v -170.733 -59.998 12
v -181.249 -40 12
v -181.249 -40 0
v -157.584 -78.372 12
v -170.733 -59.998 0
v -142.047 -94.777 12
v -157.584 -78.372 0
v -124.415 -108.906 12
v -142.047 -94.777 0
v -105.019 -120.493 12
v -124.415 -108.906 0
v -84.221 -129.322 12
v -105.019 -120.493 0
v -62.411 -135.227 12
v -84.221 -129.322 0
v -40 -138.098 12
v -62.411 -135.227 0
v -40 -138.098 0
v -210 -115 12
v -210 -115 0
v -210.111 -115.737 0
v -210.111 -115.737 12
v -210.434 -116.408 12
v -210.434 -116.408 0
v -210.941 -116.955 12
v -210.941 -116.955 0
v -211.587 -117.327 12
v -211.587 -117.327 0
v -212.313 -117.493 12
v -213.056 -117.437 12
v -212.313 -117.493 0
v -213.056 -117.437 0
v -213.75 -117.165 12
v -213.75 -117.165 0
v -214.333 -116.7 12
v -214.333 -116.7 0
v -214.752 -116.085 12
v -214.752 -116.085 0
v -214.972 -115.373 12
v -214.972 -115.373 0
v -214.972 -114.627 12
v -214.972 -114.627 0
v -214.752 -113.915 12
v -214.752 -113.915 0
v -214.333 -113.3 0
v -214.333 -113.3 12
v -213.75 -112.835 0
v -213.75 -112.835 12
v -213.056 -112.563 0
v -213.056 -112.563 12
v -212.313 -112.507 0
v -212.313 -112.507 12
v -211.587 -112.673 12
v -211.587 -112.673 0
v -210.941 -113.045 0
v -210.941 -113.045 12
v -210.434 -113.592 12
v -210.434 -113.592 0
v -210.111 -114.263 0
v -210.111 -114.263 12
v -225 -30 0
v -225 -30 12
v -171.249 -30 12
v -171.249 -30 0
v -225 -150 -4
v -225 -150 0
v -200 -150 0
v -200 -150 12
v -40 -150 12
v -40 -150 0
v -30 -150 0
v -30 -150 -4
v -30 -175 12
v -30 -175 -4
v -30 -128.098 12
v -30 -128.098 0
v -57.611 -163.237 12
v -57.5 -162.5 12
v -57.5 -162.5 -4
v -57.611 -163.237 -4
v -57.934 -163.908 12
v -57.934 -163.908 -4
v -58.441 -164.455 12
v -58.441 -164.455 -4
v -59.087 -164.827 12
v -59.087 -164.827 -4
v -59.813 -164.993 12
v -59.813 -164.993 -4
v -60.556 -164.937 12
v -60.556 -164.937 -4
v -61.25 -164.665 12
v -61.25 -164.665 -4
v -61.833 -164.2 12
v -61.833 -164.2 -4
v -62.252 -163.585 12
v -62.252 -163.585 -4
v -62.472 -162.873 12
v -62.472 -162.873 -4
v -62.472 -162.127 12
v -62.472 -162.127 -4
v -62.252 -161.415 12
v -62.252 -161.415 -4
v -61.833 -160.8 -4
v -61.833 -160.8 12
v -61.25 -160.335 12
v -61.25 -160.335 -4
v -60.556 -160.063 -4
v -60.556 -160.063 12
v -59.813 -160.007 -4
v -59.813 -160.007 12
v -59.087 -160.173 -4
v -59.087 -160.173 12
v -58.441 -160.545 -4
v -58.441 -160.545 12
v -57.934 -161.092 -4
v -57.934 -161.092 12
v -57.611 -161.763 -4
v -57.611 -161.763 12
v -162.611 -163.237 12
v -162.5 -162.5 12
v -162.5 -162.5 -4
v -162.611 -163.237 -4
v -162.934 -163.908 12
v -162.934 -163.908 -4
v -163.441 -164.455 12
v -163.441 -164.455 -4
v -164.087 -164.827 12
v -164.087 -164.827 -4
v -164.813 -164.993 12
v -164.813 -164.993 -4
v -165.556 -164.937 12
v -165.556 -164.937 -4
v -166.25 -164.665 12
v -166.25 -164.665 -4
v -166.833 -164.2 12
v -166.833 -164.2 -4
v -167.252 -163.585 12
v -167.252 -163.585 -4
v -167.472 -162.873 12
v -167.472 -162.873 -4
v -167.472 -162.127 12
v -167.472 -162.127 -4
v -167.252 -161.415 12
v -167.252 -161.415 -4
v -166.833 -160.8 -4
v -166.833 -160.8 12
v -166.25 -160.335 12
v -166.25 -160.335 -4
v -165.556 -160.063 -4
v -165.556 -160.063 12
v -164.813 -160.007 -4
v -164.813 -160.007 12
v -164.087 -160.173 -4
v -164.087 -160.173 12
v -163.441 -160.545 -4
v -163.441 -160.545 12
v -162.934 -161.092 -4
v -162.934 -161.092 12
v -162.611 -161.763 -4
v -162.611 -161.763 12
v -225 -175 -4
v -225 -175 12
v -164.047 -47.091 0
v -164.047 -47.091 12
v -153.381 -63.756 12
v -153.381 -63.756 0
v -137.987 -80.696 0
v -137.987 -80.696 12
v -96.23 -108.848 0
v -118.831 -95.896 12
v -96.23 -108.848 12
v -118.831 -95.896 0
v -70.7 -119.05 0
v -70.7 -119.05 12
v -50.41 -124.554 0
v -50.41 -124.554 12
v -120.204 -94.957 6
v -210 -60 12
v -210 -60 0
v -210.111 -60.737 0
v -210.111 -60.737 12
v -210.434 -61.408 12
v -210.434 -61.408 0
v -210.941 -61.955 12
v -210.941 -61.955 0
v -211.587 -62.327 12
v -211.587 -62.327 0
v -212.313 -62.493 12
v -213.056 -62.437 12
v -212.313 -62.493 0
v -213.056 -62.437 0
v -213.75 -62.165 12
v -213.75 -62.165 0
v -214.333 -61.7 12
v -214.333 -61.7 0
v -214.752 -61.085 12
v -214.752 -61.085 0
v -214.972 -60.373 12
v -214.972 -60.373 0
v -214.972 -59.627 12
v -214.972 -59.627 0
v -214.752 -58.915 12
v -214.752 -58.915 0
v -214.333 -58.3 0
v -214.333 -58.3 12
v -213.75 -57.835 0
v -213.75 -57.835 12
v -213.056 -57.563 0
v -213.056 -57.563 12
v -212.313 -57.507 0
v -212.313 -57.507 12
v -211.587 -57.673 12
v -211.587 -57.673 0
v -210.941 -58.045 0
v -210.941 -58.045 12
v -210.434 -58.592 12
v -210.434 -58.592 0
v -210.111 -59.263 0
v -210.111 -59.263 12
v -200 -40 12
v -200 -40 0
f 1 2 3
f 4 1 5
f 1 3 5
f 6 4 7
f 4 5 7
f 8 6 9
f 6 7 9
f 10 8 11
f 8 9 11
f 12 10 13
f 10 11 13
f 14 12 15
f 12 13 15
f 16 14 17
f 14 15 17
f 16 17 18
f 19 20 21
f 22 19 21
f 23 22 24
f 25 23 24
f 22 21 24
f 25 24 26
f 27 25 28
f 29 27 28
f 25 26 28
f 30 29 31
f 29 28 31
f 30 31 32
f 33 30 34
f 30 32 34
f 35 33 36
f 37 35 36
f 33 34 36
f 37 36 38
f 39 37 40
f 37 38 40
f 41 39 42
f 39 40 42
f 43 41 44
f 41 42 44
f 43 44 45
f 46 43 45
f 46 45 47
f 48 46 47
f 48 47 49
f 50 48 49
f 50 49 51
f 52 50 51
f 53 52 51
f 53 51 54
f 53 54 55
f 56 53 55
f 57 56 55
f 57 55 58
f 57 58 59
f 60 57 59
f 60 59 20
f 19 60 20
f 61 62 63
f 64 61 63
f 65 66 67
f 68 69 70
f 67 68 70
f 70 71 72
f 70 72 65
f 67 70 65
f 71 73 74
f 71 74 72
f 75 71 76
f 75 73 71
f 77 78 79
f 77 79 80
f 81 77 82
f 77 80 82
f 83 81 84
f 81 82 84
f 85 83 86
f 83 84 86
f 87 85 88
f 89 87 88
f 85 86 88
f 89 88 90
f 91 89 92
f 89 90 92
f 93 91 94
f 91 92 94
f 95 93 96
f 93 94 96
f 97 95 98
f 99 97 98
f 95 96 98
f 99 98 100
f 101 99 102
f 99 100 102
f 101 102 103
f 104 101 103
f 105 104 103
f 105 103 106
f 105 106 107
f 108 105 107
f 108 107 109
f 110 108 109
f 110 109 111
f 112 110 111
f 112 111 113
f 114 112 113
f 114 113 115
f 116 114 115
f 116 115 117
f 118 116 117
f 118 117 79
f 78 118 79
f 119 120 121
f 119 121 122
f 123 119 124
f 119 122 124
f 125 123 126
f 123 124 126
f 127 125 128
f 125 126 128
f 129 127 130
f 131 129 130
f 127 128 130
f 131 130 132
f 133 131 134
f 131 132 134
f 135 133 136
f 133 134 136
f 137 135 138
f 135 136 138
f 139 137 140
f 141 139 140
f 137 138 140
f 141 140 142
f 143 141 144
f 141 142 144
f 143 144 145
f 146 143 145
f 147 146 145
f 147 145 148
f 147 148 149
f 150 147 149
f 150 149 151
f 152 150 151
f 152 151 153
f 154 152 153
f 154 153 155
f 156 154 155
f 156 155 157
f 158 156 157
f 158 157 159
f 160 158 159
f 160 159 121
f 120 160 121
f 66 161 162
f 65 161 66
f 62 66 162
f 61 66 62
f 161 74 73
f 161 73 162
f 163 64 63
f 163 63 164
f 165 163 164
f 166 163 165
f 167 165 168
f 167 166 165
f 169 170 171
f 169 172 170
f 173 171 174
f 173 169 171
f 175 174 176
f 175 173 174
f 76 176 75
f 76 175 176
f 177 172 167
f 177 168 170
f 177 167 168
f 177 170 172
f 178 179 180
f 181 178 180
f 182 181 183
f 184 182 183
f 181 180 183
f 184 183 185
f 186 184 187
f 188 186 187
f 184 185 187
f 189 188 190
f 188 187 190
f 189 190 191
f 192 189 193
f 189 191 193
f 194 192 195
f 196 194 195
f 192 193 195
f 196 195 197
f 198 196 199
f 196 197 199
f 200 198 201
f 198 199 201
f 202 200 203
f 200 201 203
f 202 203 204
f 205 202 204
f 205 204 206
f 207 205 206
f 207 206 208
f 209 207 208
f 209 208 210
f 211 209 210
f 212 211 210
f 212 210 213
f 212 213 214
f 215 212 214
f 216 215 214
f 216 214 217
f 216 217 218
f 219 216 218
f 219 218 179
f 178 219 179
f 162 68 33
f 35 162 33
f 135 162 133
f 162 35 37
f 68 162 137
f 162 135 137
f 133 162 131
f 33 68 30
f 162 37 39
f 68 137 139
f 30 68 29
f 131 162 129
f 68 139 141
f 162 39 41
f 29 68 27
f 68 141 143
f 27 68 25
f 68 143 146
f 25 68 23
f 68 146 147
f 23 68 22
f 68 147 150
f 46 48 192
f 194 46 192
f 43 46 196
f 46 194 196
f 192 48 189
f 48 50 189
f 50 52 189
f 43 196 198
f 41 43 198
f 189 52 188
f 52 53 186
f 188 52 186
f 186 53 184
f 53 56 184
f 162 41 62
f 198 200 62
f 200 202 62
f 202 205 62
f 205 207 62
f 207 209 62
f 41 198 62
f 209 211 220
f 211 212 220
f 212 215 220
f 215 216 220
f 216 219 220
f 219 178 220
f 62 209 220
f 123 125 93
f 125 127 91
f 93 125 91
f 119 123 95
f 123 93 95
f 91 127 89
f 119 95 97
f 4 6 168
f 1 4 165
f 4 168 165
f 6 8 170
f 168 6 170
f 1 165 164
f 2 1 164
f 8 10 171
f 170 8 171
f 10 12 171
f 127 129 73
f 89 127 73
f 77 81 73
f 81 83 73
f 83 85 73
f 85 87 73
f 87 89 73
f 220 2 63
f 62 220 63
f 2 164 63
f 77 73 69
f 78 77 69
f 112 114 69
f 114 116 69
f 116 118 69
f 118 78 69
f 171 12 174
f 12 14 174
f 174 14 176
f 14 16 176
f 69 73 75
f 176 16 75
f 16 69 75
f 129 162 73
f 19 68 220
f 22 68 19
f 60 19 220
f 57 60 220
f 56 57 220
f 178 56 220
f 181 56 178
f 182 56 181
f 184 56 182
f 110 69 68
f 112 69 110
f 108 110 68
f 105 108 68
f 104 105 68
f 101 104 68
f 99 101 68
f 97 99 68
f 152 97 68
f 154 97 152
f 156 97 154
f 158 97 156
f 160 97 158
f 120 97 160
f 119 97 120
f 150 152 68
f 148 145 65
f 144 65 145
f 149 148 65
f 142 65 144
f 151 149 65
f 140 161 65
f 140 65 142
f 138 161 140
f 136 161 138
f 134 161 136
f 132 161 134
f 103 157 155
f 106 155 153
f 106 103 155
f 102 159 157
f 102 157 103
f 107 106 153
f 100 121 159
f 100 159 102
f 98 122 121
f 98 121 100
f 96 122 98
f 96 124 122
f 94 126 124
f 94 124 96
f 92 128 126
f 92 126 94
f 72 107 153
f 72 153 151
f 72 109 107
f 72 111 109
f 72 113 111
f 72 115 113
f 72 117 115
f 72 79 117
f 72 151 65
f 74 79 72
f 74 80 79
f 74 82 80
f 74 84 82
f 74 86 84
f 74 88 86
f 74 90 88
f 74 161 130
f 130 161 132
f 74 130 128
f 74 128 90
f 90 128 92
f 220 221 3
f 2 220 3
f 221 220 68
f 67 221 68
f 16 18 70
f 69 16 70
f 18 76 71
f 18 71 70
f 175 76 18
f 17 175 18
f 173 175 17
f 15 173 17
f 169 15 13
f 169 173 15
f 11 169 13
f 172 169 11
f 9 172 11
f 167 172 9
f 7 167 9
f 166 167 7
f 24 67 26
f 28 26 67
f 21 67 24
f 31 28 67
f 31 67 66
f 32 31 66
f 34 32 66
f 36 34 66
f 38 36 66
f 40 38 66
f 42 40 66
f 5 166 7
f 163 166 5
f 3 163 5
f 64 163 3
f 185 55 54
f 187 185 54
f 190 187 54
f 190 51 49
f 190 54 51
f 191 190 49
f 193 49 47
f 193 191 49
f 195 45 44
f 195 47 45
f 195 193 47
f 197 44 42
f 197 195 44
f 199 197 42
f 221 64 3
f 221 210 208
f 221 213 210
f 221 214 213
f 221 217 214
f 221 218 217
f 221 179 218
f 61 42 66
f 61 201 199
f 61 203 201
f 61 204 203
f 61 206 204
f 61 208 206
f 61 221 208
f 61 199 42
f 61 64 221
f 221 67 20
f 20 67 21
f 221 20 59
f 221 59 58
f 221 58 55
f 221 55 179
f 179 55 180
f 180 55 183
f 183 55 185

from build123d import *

# Parameters (mm, degrees)
F1_DEPTH  = 12
F2_W      = 200
F2_H      = 20
F3_DEPTH  = 5
F4_W      = 155
F4_H      = 20
F5_DEPTH  = 5
F6_R      = 2.5
F7_DEPTH  = 25
F9_DEPTH  = 5
F10_W     = 195
F10_H     = 30
F10_W_2   = 30
F10_H_2   = 145
F11_DEPTH = 25
F12_W     = 145
F12_H     = 9
F13_DEPTH = 195.0010001
F15_DEPTH = 25
F17_DEPTH = 25


with BuildPart() as f1:
    # F0 (on Top) → F1 (new body)
    with BuildSketch(Plane.XY):
        with BuildLine():
            add(Edge.make_bspline(
                [(-176, 0), (-176, -130), (0, -130)],
                knots=[3.1415926536, 3.1415926536, 3.1415926536, 4.7123889804, 4.7123889804, 4.7123889804], degree=2, weights=[1, 0.7071067812, 1]))
            Line((-176, 0), (-176, -130))
            Line((-176, -130), (0, -130))
        make_face()
        Polygon((-176, -130), (-176, 0), (-200, 0), (-200, -150), (0, -150), (0, -130), align=None)
    extrude(amount=F1_DEPTH)

    # F2 (on face) → F3 (join)
    with BuildSketch(Plane.XZ.offset(150)):
        with Locations((-100, 6)):
            Rectangle(F2_W, F2_H)
    extrude(amount=F3_DEPTH)

    # F4 (on face) → F5 (join)
    with BuildSketch(Plane(origin=(-200, 0, 0), x_dir=(0, -1, 0), z_dir=(-1, 0, 0))):
        with Locations((77.5, 6)):
            Rectangle(F4_W, F4_H)
    extrude(amount=F5_DEPTH)

    # F6 (on face) → F7 (join)
    with BuildSketch(Plane(origin=(0, 0, -4), x_dir=(1, 0, 0), z_dir=(0, 0, -1))):
        Polygon((0, 155), (0, 175), (-225, 175), (-225, 0), (-205, 0), (-205, 155), align=None)
        with Locations((-212.5, 60)):
            Circle(F6_R, mode=Mode.SUBTRACT)
        with Locations((-212.5, 115)):
            Circle(F6_R, mode=Mode.SUBTRACT)
        with Locations((-165, 162.5)):
            Circle(F6_R, mode=Mode.SUBTRACT)
        with Locations((-60, 162.5)):
            Circle(F6_R, mode=Mode.SUBTRACT)
    extrude(amount=-F7_DEPTH)

    # F8 (on face) → F9 (join)
    with BuildSketch(Plane.XY.offset(16)):
        Polygon((-190, 0), (-205, 0), (-205, -155), (0, -155), (0, -140), (-190, -140), align=None)
    extrude(amount=F9_DEPTH)

    # F10 (on Top) → F11 (cut, symmetric)
    with BuildSketch(Plane.XY):
        with Locations((-127.5, -15)):
            Rectangle(F10_W, F10_H)
        with Locations((-15, -15)):
            Rectangle(F10_W_2, F10_H)
        with Locations((-15, -102.5)):
            Rectangle(F10_W_2, F10_H_2)
    extrude(amount=F11_DEPTH, both=True, mode=Mode.SUBTRACT)

    # F12 (on face) → F13 (cut, through all)
    with BuildSketch(Plane.YZ.offset(-30)):
        with Locations((-102.5, 16.5)):
            Rectangle(F12_W, F12_H)
    extrude(amount=-F13_DEPTH, mode=Mode.SUBTRACT)

    # F14 (on face) → F15 (cut)
    with BuildSketch(Plane(origin=(0, 0, 0), x_dir=(1, 0, 0), z_dir=(0, 0, -1))):
        with BuildLine():
            ThreePointArc((-181.2494979045, 40), (-124.4154289012, 108.9058025162), (-40, 138.0975202339))
            Line((-40, 138.0975202339), (-40, 150))
            Line((-40, 150), (-200, 150))
            Line((-200, 150), (-200, 40))
            Line((-200, 40), (-181.2494979045, 40))
        make_face()
    extrude(amount=-F15_DEPTH, mode=Mode.SUBTRACT)

    # F16 (on face) → F17 (cut, through all)
    with BuildSketch(Plane.YZ.offset(-200)):
        Polygon((-150, 0), (-150, -4), (-30, -4), (-30, 0), (-40, 0), align=None)
    extrude(amount=-F17_DEPTH, mode=Mode.SUBTRACT)


solid = f1.part
